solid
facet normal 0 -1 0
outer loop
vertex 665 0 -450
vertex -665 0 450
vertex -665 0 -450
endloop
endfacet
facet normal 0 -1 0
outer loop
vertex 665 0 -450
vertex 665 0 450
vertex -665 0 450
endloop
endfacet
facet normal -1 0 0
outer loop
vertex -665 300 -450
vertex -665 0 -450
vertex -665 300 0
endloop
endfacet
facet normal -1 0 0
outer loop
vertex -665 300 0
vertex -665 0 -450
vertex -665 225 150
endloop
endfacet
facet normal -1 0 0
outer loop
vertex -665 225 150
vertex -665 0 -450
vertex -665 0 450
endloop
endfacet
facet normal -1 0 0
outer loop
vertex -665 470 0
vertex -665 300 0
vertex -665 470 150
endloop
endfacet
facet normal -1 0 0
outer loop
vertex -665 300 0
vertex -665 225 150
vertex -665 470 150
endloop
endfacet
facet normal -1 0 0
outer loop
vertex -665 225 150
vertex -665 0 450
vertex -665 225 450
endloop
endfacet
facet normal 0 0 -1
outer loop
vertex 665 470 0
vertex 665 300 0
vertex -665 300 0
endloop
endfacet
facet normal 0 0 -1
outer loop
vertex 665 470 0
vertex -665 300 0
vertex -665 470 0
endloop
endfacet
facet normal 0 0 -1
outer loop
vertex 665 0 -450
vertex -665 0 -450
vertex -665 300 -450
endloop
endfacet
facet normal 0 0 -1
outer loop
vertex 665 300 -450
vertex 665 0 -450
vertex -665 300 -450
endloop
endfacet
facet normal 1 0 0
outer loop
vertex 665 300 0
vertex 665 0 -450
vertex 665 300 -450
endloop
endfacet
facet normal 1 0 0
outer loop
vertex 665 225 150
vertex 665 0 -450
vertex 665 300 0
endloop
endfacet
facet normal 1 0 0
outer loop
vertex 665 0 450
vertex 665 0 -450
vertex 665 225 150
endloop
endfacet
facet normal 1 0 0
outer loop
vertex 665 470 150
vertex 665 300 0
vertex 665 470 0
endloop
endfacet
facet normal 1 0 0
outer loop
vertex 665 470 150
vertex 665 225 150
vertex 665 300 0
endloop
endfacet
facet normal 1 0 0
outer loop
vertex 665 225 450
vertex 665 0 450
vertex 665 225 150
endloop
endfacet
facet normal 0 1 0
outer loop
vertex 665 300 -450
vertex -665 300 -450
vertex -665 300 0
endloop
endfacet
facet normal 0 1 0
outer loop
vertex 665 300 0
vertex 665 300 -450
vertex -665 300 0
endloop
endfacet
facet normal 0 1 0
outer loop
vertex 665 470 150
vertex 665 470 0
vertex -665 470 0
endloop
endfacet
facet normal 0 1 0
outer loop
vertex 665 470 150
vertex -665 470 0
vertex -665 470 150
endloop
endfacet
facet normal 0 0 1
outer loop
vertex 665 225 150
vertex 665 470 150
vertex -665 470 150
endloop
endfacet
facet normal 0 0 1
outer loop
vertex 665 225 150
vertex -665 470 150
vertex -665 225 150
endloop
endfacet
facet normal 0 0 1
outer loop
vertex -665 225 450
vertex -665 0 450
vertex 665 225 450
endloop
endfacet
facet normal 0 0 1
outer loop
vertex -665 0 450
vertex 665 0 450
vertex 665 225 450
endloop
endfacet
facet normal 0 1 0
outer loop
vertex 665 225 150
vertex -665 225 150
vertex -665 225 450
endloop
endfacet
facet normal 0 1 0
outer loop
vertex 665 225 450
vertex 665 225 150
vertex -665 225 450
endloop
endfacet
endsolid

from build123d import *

# Parameters (mm, degrees)
F0_W     = 225
F0_H     = 300
F0_W_2   = 300
F0_H_2   = 450
F1_DEPTH = 665


with BuildPart() as f1:
    # F0 (on Right) → F1 (new body, symmetric)
    with BuildSketch(Plane.YZ):
        with Locations((112.5, 300)):
            Rectangle(F0_W, F0_H)
        Polygon((0, 150), (0, 0), (300, 0), (470, 0), (470, 150), (225, 150), align=None)
        with Locations((150, -225)):
            Rectangle(F0_W_2, F0_H_2)
    extrude(amount=F1_DEPTH, both=True)


solid = f1.part
